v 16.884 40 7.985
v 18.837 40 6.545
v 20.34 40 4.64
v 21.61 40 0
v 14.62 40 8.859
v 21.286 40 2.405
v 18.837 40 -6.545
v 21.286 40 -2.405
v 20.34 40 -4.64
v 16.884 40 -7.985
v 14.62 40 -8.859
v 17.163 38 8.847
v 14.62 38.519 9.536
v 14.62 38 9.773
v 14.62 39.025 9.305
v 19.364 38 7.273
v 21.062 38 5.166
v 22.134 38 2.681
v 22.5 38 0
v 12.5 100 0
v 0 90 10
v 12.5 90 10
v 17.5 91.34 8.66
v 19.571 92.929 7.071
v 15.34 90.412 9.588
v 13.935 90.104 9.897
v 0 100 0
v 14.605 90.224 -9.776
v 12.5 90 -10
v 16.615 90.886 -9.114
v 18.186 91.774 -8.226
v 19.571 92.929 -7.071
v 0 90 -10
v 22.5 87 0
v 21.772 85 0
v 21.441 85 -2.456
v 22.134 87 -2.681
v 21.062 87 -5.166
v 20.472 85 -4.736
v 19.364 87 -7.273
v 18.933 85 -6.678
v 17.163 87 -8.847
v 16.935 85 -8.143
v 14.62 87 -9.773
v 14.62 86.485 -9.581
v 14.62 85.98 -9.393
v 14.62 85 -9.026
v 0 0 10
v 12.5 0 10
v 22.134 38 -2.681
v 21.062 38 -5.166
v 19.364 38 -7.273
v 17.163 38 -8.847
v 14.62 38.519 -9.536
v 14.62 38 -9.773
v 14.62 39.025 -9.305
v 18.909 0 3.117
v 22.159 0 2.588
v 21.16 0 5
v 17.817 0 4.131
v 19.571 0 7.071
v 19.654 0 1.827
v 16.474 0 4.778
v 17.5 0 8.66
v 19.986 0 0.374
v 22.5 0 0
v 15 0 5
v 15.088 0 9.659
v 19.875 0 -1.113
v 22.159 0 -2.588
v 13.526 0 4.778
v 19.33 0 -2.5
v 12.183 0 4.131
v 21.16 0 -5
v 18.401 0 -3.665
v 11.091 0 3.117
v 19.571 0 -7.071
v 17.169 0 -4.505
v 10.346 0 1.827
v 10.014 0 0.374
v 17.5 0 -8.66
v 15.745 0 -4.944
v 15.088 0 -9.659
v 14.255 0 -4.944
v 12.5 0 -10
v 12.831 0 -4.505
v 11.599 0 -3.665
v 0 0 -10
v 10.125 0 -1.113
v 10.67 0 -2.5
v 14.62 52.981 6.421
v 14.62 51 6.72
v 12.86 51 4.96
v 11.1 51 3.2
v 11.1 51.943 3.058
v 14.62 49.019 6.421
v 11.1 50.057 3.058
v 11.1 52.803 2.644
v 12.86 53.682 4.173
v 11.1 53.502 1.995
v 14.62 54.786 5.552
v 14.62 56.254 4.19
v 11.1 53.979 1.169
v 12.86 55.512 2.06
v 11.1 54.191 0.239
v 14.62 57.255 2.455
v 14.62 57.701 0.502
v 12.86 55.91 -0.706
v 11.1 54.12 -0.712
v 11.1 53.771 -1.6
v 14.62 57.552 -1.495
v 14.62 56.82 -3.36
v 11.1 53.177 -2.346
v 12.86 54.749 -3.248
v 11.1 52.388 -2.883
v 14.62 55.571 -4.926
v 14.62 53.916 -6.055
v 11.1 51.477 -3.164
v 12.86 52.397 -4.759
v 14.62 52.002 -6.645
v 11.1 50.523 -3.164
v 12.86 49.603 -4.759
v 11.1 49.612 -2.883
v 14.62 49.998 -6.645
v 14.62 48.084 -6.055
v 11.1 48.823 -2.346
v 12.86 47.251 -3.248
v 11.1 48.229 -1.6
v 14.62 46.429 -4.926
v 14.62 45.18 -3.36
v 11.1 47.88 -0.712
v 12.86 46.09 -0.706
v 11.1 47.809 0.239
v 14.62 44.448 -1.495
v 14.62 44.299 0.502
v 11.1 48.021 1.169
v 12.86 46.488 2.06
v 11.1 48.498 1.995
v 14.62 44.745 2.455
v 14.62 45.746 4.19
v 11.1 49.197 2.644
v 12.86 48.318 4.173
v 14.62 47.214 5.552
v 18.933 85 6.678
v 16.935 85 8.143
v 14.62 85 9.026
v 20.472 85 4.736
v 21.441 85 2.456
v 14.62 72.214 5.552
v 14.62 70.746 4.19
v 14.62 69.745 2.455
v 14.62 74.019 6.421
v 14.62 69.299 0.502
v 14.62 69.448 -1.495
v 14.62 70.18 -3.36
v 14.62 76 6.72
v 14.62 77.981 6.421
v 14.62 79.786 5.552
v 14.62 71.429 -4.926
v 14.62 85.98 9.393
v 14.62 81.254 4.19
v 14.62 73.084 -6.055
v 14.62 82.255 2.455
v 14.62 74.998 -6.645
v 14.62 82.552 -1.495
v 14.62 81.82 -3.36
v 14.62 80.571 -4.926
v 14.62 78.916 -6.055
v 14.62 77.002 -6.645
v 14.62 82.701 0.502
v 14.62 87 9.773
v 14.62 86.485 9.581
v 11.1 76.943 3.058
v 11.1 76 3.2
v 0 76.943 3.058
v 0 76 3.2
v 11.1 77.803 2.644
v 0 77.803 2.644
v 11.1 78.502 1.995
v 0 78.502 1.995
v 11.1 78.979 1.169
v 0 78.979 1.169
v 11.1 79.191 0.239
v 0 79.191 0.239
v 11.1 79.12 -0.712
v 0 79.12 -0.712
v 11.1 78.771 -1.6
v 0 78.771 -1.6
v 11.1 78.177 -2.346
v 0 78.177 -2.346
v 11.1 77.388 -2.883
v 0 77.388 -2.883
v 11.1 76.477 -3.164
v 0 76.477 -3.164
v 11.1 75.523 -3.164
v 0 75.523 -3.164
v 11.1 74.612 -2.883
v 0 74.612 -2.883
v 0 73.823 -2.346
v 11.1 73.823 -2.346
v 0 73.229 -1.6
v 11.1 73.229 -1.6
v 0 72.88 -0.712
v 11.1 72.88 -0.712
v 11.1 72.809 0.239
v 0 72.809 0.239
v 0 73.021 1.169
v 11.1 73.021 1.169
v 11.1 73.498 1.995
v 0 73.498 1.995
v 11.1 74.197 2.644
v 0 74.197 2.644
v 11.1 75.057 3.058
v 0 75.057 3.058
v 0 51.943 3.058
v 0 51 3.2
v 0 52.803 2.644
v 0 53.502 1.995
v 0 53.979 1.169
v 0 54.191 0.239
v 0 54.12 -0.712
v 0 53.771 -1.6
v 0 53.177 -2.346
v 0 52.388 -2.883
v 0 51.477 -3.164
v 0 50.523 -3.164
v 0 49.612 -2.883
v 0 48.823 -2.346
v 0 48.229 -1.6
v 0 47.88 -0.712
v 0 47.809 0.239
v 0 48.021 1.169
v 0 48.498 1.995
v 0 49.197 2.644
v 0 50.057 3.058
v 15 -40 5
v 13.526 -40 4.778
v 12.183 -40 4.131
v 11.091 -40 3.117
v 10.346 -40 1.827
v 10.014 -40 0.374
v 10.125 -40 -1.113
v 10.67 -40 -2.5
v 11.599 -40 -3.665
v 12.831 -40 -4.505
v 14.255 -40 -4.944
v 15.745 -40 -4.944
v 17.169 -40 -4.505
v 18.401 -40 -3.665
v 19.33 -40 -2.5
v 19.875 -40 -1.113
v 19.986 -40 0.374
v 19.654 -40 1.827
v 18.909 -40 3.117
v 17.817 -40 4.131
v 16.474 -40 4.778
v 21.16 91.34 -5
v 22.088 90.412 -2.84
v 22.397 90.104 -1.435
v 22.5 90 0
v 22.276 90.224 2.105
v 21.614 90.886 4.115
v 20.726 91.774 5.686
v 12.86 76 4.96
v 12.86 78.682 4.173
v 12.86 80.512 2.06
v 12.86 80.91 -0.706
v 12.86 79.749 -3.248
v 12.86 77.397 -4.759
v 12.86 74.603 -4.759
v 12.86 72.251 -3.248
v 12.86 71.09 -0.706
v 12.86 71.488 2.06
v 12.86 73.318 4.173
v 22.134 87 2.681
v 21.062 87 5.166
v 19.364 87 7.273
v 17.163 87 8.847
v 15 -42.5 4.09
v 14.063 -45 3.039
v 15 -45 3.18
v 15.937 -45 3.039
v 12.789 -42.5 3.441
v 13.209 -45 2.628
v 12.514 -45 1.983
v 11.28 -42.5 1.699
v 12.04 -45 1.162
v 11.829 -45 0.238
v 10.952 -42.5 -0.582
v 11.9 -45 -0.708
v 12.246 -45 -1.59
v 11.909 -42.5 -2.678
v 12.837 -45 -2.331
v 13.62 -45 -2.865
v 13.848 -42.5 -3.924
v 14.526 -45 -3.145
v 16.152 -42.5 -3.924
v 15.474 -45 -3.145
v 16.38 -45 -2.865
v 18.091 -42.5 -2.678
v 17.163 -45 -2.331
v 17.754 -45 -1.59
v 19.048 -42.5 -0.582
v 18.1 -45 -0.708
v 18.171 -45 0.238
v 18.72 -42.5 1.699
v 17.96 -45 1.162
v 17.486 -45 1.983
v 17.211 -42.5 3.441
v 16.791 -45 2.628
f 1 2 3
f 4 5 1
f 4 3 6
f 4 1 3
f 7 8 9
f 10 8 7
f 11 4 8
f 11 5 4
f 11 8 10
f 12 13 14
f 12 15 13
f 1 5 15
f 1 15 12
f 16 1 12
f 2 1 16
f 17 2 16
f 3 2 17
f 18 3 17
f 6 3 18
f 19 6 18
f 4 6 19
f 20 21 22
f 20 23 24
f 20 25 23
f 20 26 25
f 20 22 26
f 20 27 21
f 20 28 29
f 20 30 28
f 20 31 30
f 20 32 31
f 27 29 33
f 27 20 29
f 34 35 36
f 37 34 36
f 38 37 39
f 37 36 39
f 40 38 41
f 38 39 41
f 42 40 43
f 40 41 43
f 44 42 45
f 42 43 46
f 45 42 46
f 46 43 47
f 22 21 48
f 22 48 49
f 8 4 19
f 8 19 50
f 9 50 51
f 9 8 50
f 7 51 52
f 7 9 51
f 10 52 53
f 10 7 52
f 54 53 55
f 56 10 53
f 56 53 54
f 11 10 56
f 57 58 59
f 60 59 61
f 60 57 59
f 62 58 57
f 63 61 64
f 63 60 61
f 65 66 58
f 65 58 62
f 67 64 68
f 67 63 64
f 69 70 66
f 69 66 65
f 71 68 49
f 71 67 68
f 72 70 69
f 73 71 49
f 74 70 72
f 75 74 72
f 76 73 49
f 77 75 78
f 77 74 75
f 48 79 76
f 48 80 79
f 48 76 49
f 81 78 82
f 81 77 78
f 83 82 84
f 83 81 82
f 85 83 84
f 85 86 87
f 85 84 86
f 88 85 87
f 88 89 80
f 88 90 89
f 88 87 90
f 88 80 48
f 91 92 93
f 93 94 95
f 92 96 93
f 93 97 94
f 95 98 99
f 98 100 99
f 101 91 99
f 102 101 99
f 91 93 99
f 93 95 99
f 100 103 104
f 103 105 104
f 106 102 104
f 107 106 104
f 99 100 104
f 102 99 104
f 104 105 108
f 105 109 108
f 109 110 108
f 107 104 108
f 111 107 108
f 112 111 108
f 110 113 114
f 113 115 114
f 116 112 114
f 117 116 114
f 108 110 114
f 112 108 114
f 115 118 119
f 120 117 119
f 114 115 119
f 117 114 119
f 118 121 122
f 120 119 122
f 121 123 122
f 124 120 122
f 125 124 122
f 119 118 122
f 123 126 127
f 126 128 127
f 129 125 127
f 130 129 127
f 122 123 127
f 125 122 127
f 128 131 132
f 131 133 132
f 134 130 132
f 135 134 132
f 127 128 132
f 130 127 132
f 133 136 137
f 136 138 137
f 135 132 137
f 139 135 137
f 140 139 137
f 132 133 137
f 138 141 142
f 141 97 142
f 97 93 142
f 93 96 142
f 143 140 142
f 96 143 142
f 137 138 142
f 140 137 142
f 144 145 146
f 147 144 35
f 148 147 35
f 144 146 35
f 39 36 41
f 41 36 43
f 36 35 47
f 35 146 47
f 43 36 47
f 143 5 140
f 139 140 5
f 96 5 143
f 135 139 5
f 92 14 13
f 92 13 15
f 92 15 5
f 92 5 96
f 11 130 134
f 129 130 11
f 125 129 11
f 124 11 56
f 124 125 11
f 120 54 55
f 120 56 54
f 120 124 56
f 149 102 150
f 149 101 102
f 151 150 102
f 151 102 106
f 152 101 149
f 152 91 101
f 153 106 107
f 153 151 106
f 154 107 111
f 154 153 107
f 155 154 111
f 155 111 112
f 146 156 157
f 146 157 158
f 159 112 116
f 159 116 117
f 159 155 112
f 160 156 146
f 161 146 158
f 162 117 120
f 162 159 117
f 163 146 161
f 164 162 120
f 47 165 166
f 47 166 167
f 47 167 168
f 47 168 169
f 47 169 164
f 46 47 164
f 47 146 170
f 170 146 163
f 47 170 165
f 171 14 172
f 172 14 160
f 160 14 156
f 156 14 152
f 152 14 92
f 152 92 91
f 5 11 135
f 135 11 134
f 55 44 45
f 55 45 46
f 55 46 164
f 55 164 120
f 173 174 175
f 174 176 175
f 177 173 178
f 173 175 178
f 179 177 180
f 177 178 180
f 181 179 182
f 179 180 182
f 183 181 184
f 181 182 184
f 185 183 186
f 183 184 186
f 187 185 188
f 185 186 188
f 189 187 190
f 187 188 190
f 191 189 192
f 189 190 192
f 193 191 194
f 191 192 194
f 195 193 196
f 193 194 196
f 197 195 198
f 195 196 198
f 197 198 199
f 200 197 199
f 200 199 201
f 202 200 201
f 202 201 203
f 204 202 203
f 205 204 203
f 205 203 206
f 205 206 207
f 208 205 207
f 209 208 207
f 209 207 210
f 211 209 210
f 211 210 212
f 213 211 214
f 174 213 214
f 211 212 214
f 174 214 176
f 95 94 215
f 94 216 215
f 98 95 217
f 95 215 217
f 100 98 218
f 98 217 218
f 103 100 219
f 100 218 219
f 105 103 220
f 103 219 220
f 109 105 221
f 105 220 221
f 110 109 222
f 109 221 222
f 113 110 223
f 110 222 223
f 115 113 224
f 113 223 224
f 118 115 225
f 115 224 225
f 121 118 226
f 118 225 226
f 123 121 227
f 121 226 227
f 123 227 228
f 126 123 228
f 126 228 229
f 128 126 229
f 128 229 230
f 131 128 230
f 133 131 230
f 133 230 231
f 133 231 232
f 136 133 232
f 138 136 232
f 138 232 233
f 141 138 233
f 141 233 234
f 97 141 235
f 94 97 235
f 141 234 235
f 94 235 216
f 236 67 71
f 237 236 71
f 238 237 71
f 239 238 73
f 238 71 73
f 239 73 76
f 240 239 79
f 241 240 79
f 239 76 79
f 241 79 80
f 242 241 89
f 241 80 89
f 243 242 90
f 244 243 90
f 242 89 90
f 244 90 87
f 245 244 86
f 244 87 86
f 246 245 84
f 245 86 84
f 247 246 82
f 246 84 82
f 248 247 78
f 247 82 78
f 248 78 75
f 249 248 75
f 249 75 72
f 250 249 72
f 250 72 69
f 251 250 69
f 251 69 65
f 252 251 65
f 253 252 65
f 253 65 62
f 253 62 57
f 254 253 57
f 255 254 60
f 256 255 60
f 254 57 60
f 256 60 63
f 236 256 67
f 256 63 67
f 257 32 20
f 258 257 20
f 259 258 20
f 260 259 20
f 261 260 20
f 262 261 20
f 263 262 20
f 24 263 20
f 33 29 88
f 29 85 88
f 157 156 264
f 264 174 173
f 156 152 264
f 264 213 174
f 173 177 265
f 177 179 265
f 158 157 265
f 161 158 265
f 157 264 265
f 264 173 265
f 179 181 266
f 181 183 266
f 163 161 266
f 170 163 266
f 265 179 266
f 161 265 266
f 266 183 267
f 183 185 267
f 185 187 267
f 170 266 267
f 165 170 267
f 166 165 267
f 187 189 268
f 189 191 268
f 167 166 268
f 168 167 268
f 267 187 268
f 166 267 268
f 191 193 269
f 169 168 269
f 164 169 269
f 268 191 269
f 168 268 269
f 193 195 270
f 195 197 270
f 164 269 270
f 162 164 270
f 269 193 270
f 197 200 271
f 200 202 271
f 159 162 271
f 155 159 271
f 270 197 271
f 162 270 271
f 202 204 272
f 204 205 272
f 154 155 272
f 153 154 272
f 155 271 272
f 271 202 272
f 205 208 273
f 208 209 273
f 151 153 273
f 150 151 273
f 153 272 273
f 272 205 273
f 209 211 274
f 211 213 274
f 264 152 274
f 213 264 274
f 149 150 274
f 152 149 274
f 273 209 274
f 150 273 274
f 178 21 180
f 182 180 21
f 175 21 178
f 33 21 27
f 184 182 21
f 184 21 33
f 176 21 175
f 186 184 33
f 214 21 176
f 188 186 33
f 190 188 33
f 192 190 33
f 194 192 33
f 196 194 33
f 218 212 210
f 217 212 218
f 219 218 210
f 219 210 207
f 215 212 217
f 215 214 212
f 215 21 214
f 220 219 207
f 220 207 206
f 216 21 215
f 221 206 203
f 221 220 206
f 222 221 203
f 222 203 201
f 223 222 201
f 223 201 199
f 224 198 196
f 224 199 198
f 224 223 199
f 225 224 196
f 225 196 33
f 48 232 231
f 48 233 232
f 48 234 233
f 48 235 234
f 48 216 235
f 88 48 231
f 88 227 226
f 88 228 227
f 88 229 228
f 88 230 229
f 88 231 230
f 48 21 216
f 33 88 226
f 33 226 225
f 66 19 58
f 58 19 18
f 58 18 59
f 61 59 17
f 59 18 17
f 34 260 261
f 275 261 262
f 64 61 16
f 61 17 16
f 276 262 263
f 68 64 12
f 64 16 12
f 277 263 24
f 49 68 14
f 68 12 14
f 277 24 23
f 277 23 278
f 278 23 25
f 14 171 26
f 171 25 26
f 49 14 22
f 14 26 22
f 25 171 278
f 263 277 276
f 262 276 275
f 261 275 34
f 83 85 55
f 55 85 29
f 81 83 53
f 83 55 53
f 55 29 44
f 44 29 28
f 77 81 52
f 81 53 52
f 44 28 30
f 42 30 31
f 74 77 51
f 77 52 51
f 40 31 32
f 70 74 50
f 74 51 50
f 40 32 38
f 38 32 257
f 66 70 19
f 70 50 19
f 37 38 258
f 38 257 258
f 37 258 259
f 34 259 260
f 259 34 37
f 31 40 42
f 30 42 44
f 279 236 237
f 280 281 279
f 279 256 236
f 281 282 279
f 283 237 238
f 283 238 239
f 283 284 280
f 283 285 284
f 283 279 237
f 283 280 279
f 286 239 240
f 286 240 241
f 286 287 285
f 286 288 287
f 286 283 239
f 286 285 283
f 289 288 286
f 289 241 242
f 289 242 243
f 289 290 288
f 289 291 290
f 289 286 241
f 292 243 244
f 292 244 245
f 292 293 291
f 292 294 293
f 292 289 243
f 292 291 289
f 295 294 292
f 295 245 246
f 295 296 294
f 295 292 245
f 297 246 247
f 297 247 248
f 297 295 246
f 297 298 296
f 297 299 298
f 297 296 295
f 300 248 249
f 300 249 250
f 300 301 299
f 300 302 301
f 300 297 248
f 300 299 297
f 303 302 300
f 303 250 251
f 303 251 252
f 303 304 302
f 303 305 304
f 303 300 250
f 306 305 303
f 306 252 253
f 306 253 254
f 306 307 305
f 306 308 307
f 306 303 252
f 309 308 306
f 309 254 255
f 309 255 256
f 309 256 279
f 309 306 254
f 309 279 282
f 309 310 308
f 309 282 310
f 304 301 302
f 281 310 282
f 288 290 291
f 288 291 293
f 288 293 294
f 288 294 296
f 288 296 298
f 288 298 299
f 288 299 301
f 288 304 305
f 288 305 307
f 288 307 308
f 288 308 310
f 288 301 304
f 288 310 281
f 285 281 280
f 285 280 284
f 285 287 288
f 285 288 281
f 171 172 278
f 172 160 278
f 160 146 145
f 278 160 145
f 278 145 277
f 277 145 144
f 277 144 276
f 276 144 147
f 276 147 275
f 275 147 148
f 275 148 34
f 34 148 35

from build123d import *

# Parameters (mm, degrees)
DODANIE_WYCI_GNI_CIE1_DEPTH                        = 100
SFAZOWANIE1_SIZE                                   = 10
ZAOKR_GLENIE1_R                                    = 10
SZKIC3_W                                           = 20
SZKIC3_H                                           = 45
WYTNIJ_WYCI_GNI_CIE1_DEPTH                         = 100
SFAZOWANIE2_SIZE2                                  = 0.890457371
SFAZOWANIE2_SIZE                                   = 2
SFAZOWANIE3_SIZE2                                  = 0.727940469
SFAZOWANIE3_SIZE                                   = 2
POG_BIENIE_STO_KOWE_POD_M6_WKR_T_Z_BEM_D           = 6.4
POG_BIENIE_STO_KOWE_POD_M6_WKR_T_Z_BEM_DEPTH       = 40
POG_BIENIE_STO_KOWE_POD_M6_WKR_T_Z_BEM_CSINK_D     = 13.44
POG_BIENIE_STO_KOWE_POD_M6_WKR_T_Z_BEM_CSINK_ANGLE = 90
POG_BIENIE_STO_KOWE_POD_M6_WKR_T_Z_BEM_TIP         = 1.922753981
SZKIC7_R                                           = 5
DODANIE_WYCI_GNI_CIE2_DEPTH                        = 45
SFAZOWANIE5_SIZE                                   = 5
SFAZOWANIE5_SIZE2                                  = 1.819851171


with BuildPart() as part:
    # Szkic2 → Dodanie-wyciągnięcie1 (new body)
    with BuildSketch(Plane(origin=(0, 0, 0), x_dir=(1, 0, 0), z_dir=(0, 1, 0))):
        Polygon((2.12, 10), (22.5, 10), (22.5, -10), (2.12, -10), (0, -10), (0, 10), align=None)
    extrude(amount=DODANIE_WYCI_GNI_CIE1_DEPTH)

    # Sfazowanie1
    sfazowanie1_edges = [part.edges().sort_by_distance(p)[0] for p in [
        (11.25, 100, -10),
        (22.5, 100, 0),
        (11.25, 100, 10),
    ]]
    chamfer(sfazowanie1_edges, length=SFAZOWANIE1_SIZE - 0.0001)  # a hair under: the kernel refuses the full size

    # Zaokrąglenie1
    zaokr_glenie1_edges = [part.edges().sort_by_distance(p)[0] for p in [
        (22.5, 45.00005, -10),
        (22.5, 45.00005, 10),
    ]]
    fillet(zaokr_glenie1_edges, radius=ZAOKR_GLENIE1_R - 0.0001)  # a hair under: the kernel refuses the full size

    # Szkic3 → Wytnij-wyciągnięcie1 (cut)
    with BuildSketch(Plane(origin=(14.62, 0, 0), x_dir=(0, 0, -1), z_dir=(1, 0, 0))):
        with Locations((0, 62.5)):
            Rectangle(SZKIC3_W, SZKIC3_H)
    extrude(amount=WYTNIJ_WYCI_GNI_CIE1_DEPTH, mode=Mode.SUBTRACT)

    # Sfazowanie2
    sfazowanie2_edges = [part.edges().sort_by_distance(p)[0] for p in [
        (20.28459703, 40, -6.277010546),
        (20.28459703, 40, 6.277010546),
    ]]
    chamfer(sfazowanie2_edges, length=SFAZOWANIE2_SIZE, length2=SFAZOWANIE2_SIZE2)

    # Sfazowanie3
    sfazowanie3_edges = [part.edges().sort_by_distance(p)[0] for p in [
        (20.28459703, 85, -6.277010546),
        (20.28459703, 85, 6.277010546),
    ]]
    chamfer(sfazowanie3_edges, length=SFAZOWANIE3_SIZE, length2=SFAZOWANIE3_SIZE2)

    # Pogłębienie stożkowe pod M6 Wkręt z łbem stożkowym płaskim2
    with Locations(Plane(origin=(14.62, 0, 0), x_dir=(0, 0, -1), z_dir=(1, 0, 0))):
        with Locations((0, 51), (0, 76)):
            CounterSinkHole(POG_BIENIE_STO_KOWE_POD_M6_WKR_T_Z_BEM_D / 2, POG_BIENIE_STO_KOWE_POD_M6_WKR_T_Z_BEM_CSINK_D / 2, depth=POG_BIENIE_STO_KOWE_POD_M6_WKR_T_Z_BEM_DEPTH, counter_sink_angle=POG_BIENIE_STO_KOWE_POD_M6_WKR_T_Z_BEM_CSINK_ANGLE)
            with Locations((0, 0, -(POG_BIENIE_STO_KOWE_POD_M6_WKR_T_Z_BEM_DEPTH + POG_BIENIE_STO_KOWE_POD_M6_WKR_T_Z_BEM_TIP / 2))):  # 118° drill point
                Cone(0, POG_BIENIE_STO_KOWE_POD_M6_WKR_T_Z_BEM_D / 2, POG_BIENIE_STO_KOWE_POD_M6_WKR_T_Z_BEM_TIP, mode=Mode.SUBTRACT)

    # Szkic7 → Dodanie-wyciągnięcie2 (add)
    with BuildSketch(Plane.XZ):
        with Locations(Location((15, 0, 0), (0, 0, 90))):
            Circle(SZKIC7_R)
    extrude(amount=DODANIE_WYCI_GNI_CIE2_DEPTH)

    # Sfazowanie5
    sfazowanie5_edges = [part.edges().sort_by_distance(p)[0] for p in [
        (15, -45, -5),
    ]]
    sfazowanie5_side = [part.faces().sort_by_distance(p)[0] for p in [
        (15, -22.5, -5),
    ]]
    chamfer(sfazowanie5_edges, length=SFAZOWANIE5_SIZE, length2=SFAZOWANIE5_SIZE2, reference=sfazowanie5_side[0])


solid = part.part
